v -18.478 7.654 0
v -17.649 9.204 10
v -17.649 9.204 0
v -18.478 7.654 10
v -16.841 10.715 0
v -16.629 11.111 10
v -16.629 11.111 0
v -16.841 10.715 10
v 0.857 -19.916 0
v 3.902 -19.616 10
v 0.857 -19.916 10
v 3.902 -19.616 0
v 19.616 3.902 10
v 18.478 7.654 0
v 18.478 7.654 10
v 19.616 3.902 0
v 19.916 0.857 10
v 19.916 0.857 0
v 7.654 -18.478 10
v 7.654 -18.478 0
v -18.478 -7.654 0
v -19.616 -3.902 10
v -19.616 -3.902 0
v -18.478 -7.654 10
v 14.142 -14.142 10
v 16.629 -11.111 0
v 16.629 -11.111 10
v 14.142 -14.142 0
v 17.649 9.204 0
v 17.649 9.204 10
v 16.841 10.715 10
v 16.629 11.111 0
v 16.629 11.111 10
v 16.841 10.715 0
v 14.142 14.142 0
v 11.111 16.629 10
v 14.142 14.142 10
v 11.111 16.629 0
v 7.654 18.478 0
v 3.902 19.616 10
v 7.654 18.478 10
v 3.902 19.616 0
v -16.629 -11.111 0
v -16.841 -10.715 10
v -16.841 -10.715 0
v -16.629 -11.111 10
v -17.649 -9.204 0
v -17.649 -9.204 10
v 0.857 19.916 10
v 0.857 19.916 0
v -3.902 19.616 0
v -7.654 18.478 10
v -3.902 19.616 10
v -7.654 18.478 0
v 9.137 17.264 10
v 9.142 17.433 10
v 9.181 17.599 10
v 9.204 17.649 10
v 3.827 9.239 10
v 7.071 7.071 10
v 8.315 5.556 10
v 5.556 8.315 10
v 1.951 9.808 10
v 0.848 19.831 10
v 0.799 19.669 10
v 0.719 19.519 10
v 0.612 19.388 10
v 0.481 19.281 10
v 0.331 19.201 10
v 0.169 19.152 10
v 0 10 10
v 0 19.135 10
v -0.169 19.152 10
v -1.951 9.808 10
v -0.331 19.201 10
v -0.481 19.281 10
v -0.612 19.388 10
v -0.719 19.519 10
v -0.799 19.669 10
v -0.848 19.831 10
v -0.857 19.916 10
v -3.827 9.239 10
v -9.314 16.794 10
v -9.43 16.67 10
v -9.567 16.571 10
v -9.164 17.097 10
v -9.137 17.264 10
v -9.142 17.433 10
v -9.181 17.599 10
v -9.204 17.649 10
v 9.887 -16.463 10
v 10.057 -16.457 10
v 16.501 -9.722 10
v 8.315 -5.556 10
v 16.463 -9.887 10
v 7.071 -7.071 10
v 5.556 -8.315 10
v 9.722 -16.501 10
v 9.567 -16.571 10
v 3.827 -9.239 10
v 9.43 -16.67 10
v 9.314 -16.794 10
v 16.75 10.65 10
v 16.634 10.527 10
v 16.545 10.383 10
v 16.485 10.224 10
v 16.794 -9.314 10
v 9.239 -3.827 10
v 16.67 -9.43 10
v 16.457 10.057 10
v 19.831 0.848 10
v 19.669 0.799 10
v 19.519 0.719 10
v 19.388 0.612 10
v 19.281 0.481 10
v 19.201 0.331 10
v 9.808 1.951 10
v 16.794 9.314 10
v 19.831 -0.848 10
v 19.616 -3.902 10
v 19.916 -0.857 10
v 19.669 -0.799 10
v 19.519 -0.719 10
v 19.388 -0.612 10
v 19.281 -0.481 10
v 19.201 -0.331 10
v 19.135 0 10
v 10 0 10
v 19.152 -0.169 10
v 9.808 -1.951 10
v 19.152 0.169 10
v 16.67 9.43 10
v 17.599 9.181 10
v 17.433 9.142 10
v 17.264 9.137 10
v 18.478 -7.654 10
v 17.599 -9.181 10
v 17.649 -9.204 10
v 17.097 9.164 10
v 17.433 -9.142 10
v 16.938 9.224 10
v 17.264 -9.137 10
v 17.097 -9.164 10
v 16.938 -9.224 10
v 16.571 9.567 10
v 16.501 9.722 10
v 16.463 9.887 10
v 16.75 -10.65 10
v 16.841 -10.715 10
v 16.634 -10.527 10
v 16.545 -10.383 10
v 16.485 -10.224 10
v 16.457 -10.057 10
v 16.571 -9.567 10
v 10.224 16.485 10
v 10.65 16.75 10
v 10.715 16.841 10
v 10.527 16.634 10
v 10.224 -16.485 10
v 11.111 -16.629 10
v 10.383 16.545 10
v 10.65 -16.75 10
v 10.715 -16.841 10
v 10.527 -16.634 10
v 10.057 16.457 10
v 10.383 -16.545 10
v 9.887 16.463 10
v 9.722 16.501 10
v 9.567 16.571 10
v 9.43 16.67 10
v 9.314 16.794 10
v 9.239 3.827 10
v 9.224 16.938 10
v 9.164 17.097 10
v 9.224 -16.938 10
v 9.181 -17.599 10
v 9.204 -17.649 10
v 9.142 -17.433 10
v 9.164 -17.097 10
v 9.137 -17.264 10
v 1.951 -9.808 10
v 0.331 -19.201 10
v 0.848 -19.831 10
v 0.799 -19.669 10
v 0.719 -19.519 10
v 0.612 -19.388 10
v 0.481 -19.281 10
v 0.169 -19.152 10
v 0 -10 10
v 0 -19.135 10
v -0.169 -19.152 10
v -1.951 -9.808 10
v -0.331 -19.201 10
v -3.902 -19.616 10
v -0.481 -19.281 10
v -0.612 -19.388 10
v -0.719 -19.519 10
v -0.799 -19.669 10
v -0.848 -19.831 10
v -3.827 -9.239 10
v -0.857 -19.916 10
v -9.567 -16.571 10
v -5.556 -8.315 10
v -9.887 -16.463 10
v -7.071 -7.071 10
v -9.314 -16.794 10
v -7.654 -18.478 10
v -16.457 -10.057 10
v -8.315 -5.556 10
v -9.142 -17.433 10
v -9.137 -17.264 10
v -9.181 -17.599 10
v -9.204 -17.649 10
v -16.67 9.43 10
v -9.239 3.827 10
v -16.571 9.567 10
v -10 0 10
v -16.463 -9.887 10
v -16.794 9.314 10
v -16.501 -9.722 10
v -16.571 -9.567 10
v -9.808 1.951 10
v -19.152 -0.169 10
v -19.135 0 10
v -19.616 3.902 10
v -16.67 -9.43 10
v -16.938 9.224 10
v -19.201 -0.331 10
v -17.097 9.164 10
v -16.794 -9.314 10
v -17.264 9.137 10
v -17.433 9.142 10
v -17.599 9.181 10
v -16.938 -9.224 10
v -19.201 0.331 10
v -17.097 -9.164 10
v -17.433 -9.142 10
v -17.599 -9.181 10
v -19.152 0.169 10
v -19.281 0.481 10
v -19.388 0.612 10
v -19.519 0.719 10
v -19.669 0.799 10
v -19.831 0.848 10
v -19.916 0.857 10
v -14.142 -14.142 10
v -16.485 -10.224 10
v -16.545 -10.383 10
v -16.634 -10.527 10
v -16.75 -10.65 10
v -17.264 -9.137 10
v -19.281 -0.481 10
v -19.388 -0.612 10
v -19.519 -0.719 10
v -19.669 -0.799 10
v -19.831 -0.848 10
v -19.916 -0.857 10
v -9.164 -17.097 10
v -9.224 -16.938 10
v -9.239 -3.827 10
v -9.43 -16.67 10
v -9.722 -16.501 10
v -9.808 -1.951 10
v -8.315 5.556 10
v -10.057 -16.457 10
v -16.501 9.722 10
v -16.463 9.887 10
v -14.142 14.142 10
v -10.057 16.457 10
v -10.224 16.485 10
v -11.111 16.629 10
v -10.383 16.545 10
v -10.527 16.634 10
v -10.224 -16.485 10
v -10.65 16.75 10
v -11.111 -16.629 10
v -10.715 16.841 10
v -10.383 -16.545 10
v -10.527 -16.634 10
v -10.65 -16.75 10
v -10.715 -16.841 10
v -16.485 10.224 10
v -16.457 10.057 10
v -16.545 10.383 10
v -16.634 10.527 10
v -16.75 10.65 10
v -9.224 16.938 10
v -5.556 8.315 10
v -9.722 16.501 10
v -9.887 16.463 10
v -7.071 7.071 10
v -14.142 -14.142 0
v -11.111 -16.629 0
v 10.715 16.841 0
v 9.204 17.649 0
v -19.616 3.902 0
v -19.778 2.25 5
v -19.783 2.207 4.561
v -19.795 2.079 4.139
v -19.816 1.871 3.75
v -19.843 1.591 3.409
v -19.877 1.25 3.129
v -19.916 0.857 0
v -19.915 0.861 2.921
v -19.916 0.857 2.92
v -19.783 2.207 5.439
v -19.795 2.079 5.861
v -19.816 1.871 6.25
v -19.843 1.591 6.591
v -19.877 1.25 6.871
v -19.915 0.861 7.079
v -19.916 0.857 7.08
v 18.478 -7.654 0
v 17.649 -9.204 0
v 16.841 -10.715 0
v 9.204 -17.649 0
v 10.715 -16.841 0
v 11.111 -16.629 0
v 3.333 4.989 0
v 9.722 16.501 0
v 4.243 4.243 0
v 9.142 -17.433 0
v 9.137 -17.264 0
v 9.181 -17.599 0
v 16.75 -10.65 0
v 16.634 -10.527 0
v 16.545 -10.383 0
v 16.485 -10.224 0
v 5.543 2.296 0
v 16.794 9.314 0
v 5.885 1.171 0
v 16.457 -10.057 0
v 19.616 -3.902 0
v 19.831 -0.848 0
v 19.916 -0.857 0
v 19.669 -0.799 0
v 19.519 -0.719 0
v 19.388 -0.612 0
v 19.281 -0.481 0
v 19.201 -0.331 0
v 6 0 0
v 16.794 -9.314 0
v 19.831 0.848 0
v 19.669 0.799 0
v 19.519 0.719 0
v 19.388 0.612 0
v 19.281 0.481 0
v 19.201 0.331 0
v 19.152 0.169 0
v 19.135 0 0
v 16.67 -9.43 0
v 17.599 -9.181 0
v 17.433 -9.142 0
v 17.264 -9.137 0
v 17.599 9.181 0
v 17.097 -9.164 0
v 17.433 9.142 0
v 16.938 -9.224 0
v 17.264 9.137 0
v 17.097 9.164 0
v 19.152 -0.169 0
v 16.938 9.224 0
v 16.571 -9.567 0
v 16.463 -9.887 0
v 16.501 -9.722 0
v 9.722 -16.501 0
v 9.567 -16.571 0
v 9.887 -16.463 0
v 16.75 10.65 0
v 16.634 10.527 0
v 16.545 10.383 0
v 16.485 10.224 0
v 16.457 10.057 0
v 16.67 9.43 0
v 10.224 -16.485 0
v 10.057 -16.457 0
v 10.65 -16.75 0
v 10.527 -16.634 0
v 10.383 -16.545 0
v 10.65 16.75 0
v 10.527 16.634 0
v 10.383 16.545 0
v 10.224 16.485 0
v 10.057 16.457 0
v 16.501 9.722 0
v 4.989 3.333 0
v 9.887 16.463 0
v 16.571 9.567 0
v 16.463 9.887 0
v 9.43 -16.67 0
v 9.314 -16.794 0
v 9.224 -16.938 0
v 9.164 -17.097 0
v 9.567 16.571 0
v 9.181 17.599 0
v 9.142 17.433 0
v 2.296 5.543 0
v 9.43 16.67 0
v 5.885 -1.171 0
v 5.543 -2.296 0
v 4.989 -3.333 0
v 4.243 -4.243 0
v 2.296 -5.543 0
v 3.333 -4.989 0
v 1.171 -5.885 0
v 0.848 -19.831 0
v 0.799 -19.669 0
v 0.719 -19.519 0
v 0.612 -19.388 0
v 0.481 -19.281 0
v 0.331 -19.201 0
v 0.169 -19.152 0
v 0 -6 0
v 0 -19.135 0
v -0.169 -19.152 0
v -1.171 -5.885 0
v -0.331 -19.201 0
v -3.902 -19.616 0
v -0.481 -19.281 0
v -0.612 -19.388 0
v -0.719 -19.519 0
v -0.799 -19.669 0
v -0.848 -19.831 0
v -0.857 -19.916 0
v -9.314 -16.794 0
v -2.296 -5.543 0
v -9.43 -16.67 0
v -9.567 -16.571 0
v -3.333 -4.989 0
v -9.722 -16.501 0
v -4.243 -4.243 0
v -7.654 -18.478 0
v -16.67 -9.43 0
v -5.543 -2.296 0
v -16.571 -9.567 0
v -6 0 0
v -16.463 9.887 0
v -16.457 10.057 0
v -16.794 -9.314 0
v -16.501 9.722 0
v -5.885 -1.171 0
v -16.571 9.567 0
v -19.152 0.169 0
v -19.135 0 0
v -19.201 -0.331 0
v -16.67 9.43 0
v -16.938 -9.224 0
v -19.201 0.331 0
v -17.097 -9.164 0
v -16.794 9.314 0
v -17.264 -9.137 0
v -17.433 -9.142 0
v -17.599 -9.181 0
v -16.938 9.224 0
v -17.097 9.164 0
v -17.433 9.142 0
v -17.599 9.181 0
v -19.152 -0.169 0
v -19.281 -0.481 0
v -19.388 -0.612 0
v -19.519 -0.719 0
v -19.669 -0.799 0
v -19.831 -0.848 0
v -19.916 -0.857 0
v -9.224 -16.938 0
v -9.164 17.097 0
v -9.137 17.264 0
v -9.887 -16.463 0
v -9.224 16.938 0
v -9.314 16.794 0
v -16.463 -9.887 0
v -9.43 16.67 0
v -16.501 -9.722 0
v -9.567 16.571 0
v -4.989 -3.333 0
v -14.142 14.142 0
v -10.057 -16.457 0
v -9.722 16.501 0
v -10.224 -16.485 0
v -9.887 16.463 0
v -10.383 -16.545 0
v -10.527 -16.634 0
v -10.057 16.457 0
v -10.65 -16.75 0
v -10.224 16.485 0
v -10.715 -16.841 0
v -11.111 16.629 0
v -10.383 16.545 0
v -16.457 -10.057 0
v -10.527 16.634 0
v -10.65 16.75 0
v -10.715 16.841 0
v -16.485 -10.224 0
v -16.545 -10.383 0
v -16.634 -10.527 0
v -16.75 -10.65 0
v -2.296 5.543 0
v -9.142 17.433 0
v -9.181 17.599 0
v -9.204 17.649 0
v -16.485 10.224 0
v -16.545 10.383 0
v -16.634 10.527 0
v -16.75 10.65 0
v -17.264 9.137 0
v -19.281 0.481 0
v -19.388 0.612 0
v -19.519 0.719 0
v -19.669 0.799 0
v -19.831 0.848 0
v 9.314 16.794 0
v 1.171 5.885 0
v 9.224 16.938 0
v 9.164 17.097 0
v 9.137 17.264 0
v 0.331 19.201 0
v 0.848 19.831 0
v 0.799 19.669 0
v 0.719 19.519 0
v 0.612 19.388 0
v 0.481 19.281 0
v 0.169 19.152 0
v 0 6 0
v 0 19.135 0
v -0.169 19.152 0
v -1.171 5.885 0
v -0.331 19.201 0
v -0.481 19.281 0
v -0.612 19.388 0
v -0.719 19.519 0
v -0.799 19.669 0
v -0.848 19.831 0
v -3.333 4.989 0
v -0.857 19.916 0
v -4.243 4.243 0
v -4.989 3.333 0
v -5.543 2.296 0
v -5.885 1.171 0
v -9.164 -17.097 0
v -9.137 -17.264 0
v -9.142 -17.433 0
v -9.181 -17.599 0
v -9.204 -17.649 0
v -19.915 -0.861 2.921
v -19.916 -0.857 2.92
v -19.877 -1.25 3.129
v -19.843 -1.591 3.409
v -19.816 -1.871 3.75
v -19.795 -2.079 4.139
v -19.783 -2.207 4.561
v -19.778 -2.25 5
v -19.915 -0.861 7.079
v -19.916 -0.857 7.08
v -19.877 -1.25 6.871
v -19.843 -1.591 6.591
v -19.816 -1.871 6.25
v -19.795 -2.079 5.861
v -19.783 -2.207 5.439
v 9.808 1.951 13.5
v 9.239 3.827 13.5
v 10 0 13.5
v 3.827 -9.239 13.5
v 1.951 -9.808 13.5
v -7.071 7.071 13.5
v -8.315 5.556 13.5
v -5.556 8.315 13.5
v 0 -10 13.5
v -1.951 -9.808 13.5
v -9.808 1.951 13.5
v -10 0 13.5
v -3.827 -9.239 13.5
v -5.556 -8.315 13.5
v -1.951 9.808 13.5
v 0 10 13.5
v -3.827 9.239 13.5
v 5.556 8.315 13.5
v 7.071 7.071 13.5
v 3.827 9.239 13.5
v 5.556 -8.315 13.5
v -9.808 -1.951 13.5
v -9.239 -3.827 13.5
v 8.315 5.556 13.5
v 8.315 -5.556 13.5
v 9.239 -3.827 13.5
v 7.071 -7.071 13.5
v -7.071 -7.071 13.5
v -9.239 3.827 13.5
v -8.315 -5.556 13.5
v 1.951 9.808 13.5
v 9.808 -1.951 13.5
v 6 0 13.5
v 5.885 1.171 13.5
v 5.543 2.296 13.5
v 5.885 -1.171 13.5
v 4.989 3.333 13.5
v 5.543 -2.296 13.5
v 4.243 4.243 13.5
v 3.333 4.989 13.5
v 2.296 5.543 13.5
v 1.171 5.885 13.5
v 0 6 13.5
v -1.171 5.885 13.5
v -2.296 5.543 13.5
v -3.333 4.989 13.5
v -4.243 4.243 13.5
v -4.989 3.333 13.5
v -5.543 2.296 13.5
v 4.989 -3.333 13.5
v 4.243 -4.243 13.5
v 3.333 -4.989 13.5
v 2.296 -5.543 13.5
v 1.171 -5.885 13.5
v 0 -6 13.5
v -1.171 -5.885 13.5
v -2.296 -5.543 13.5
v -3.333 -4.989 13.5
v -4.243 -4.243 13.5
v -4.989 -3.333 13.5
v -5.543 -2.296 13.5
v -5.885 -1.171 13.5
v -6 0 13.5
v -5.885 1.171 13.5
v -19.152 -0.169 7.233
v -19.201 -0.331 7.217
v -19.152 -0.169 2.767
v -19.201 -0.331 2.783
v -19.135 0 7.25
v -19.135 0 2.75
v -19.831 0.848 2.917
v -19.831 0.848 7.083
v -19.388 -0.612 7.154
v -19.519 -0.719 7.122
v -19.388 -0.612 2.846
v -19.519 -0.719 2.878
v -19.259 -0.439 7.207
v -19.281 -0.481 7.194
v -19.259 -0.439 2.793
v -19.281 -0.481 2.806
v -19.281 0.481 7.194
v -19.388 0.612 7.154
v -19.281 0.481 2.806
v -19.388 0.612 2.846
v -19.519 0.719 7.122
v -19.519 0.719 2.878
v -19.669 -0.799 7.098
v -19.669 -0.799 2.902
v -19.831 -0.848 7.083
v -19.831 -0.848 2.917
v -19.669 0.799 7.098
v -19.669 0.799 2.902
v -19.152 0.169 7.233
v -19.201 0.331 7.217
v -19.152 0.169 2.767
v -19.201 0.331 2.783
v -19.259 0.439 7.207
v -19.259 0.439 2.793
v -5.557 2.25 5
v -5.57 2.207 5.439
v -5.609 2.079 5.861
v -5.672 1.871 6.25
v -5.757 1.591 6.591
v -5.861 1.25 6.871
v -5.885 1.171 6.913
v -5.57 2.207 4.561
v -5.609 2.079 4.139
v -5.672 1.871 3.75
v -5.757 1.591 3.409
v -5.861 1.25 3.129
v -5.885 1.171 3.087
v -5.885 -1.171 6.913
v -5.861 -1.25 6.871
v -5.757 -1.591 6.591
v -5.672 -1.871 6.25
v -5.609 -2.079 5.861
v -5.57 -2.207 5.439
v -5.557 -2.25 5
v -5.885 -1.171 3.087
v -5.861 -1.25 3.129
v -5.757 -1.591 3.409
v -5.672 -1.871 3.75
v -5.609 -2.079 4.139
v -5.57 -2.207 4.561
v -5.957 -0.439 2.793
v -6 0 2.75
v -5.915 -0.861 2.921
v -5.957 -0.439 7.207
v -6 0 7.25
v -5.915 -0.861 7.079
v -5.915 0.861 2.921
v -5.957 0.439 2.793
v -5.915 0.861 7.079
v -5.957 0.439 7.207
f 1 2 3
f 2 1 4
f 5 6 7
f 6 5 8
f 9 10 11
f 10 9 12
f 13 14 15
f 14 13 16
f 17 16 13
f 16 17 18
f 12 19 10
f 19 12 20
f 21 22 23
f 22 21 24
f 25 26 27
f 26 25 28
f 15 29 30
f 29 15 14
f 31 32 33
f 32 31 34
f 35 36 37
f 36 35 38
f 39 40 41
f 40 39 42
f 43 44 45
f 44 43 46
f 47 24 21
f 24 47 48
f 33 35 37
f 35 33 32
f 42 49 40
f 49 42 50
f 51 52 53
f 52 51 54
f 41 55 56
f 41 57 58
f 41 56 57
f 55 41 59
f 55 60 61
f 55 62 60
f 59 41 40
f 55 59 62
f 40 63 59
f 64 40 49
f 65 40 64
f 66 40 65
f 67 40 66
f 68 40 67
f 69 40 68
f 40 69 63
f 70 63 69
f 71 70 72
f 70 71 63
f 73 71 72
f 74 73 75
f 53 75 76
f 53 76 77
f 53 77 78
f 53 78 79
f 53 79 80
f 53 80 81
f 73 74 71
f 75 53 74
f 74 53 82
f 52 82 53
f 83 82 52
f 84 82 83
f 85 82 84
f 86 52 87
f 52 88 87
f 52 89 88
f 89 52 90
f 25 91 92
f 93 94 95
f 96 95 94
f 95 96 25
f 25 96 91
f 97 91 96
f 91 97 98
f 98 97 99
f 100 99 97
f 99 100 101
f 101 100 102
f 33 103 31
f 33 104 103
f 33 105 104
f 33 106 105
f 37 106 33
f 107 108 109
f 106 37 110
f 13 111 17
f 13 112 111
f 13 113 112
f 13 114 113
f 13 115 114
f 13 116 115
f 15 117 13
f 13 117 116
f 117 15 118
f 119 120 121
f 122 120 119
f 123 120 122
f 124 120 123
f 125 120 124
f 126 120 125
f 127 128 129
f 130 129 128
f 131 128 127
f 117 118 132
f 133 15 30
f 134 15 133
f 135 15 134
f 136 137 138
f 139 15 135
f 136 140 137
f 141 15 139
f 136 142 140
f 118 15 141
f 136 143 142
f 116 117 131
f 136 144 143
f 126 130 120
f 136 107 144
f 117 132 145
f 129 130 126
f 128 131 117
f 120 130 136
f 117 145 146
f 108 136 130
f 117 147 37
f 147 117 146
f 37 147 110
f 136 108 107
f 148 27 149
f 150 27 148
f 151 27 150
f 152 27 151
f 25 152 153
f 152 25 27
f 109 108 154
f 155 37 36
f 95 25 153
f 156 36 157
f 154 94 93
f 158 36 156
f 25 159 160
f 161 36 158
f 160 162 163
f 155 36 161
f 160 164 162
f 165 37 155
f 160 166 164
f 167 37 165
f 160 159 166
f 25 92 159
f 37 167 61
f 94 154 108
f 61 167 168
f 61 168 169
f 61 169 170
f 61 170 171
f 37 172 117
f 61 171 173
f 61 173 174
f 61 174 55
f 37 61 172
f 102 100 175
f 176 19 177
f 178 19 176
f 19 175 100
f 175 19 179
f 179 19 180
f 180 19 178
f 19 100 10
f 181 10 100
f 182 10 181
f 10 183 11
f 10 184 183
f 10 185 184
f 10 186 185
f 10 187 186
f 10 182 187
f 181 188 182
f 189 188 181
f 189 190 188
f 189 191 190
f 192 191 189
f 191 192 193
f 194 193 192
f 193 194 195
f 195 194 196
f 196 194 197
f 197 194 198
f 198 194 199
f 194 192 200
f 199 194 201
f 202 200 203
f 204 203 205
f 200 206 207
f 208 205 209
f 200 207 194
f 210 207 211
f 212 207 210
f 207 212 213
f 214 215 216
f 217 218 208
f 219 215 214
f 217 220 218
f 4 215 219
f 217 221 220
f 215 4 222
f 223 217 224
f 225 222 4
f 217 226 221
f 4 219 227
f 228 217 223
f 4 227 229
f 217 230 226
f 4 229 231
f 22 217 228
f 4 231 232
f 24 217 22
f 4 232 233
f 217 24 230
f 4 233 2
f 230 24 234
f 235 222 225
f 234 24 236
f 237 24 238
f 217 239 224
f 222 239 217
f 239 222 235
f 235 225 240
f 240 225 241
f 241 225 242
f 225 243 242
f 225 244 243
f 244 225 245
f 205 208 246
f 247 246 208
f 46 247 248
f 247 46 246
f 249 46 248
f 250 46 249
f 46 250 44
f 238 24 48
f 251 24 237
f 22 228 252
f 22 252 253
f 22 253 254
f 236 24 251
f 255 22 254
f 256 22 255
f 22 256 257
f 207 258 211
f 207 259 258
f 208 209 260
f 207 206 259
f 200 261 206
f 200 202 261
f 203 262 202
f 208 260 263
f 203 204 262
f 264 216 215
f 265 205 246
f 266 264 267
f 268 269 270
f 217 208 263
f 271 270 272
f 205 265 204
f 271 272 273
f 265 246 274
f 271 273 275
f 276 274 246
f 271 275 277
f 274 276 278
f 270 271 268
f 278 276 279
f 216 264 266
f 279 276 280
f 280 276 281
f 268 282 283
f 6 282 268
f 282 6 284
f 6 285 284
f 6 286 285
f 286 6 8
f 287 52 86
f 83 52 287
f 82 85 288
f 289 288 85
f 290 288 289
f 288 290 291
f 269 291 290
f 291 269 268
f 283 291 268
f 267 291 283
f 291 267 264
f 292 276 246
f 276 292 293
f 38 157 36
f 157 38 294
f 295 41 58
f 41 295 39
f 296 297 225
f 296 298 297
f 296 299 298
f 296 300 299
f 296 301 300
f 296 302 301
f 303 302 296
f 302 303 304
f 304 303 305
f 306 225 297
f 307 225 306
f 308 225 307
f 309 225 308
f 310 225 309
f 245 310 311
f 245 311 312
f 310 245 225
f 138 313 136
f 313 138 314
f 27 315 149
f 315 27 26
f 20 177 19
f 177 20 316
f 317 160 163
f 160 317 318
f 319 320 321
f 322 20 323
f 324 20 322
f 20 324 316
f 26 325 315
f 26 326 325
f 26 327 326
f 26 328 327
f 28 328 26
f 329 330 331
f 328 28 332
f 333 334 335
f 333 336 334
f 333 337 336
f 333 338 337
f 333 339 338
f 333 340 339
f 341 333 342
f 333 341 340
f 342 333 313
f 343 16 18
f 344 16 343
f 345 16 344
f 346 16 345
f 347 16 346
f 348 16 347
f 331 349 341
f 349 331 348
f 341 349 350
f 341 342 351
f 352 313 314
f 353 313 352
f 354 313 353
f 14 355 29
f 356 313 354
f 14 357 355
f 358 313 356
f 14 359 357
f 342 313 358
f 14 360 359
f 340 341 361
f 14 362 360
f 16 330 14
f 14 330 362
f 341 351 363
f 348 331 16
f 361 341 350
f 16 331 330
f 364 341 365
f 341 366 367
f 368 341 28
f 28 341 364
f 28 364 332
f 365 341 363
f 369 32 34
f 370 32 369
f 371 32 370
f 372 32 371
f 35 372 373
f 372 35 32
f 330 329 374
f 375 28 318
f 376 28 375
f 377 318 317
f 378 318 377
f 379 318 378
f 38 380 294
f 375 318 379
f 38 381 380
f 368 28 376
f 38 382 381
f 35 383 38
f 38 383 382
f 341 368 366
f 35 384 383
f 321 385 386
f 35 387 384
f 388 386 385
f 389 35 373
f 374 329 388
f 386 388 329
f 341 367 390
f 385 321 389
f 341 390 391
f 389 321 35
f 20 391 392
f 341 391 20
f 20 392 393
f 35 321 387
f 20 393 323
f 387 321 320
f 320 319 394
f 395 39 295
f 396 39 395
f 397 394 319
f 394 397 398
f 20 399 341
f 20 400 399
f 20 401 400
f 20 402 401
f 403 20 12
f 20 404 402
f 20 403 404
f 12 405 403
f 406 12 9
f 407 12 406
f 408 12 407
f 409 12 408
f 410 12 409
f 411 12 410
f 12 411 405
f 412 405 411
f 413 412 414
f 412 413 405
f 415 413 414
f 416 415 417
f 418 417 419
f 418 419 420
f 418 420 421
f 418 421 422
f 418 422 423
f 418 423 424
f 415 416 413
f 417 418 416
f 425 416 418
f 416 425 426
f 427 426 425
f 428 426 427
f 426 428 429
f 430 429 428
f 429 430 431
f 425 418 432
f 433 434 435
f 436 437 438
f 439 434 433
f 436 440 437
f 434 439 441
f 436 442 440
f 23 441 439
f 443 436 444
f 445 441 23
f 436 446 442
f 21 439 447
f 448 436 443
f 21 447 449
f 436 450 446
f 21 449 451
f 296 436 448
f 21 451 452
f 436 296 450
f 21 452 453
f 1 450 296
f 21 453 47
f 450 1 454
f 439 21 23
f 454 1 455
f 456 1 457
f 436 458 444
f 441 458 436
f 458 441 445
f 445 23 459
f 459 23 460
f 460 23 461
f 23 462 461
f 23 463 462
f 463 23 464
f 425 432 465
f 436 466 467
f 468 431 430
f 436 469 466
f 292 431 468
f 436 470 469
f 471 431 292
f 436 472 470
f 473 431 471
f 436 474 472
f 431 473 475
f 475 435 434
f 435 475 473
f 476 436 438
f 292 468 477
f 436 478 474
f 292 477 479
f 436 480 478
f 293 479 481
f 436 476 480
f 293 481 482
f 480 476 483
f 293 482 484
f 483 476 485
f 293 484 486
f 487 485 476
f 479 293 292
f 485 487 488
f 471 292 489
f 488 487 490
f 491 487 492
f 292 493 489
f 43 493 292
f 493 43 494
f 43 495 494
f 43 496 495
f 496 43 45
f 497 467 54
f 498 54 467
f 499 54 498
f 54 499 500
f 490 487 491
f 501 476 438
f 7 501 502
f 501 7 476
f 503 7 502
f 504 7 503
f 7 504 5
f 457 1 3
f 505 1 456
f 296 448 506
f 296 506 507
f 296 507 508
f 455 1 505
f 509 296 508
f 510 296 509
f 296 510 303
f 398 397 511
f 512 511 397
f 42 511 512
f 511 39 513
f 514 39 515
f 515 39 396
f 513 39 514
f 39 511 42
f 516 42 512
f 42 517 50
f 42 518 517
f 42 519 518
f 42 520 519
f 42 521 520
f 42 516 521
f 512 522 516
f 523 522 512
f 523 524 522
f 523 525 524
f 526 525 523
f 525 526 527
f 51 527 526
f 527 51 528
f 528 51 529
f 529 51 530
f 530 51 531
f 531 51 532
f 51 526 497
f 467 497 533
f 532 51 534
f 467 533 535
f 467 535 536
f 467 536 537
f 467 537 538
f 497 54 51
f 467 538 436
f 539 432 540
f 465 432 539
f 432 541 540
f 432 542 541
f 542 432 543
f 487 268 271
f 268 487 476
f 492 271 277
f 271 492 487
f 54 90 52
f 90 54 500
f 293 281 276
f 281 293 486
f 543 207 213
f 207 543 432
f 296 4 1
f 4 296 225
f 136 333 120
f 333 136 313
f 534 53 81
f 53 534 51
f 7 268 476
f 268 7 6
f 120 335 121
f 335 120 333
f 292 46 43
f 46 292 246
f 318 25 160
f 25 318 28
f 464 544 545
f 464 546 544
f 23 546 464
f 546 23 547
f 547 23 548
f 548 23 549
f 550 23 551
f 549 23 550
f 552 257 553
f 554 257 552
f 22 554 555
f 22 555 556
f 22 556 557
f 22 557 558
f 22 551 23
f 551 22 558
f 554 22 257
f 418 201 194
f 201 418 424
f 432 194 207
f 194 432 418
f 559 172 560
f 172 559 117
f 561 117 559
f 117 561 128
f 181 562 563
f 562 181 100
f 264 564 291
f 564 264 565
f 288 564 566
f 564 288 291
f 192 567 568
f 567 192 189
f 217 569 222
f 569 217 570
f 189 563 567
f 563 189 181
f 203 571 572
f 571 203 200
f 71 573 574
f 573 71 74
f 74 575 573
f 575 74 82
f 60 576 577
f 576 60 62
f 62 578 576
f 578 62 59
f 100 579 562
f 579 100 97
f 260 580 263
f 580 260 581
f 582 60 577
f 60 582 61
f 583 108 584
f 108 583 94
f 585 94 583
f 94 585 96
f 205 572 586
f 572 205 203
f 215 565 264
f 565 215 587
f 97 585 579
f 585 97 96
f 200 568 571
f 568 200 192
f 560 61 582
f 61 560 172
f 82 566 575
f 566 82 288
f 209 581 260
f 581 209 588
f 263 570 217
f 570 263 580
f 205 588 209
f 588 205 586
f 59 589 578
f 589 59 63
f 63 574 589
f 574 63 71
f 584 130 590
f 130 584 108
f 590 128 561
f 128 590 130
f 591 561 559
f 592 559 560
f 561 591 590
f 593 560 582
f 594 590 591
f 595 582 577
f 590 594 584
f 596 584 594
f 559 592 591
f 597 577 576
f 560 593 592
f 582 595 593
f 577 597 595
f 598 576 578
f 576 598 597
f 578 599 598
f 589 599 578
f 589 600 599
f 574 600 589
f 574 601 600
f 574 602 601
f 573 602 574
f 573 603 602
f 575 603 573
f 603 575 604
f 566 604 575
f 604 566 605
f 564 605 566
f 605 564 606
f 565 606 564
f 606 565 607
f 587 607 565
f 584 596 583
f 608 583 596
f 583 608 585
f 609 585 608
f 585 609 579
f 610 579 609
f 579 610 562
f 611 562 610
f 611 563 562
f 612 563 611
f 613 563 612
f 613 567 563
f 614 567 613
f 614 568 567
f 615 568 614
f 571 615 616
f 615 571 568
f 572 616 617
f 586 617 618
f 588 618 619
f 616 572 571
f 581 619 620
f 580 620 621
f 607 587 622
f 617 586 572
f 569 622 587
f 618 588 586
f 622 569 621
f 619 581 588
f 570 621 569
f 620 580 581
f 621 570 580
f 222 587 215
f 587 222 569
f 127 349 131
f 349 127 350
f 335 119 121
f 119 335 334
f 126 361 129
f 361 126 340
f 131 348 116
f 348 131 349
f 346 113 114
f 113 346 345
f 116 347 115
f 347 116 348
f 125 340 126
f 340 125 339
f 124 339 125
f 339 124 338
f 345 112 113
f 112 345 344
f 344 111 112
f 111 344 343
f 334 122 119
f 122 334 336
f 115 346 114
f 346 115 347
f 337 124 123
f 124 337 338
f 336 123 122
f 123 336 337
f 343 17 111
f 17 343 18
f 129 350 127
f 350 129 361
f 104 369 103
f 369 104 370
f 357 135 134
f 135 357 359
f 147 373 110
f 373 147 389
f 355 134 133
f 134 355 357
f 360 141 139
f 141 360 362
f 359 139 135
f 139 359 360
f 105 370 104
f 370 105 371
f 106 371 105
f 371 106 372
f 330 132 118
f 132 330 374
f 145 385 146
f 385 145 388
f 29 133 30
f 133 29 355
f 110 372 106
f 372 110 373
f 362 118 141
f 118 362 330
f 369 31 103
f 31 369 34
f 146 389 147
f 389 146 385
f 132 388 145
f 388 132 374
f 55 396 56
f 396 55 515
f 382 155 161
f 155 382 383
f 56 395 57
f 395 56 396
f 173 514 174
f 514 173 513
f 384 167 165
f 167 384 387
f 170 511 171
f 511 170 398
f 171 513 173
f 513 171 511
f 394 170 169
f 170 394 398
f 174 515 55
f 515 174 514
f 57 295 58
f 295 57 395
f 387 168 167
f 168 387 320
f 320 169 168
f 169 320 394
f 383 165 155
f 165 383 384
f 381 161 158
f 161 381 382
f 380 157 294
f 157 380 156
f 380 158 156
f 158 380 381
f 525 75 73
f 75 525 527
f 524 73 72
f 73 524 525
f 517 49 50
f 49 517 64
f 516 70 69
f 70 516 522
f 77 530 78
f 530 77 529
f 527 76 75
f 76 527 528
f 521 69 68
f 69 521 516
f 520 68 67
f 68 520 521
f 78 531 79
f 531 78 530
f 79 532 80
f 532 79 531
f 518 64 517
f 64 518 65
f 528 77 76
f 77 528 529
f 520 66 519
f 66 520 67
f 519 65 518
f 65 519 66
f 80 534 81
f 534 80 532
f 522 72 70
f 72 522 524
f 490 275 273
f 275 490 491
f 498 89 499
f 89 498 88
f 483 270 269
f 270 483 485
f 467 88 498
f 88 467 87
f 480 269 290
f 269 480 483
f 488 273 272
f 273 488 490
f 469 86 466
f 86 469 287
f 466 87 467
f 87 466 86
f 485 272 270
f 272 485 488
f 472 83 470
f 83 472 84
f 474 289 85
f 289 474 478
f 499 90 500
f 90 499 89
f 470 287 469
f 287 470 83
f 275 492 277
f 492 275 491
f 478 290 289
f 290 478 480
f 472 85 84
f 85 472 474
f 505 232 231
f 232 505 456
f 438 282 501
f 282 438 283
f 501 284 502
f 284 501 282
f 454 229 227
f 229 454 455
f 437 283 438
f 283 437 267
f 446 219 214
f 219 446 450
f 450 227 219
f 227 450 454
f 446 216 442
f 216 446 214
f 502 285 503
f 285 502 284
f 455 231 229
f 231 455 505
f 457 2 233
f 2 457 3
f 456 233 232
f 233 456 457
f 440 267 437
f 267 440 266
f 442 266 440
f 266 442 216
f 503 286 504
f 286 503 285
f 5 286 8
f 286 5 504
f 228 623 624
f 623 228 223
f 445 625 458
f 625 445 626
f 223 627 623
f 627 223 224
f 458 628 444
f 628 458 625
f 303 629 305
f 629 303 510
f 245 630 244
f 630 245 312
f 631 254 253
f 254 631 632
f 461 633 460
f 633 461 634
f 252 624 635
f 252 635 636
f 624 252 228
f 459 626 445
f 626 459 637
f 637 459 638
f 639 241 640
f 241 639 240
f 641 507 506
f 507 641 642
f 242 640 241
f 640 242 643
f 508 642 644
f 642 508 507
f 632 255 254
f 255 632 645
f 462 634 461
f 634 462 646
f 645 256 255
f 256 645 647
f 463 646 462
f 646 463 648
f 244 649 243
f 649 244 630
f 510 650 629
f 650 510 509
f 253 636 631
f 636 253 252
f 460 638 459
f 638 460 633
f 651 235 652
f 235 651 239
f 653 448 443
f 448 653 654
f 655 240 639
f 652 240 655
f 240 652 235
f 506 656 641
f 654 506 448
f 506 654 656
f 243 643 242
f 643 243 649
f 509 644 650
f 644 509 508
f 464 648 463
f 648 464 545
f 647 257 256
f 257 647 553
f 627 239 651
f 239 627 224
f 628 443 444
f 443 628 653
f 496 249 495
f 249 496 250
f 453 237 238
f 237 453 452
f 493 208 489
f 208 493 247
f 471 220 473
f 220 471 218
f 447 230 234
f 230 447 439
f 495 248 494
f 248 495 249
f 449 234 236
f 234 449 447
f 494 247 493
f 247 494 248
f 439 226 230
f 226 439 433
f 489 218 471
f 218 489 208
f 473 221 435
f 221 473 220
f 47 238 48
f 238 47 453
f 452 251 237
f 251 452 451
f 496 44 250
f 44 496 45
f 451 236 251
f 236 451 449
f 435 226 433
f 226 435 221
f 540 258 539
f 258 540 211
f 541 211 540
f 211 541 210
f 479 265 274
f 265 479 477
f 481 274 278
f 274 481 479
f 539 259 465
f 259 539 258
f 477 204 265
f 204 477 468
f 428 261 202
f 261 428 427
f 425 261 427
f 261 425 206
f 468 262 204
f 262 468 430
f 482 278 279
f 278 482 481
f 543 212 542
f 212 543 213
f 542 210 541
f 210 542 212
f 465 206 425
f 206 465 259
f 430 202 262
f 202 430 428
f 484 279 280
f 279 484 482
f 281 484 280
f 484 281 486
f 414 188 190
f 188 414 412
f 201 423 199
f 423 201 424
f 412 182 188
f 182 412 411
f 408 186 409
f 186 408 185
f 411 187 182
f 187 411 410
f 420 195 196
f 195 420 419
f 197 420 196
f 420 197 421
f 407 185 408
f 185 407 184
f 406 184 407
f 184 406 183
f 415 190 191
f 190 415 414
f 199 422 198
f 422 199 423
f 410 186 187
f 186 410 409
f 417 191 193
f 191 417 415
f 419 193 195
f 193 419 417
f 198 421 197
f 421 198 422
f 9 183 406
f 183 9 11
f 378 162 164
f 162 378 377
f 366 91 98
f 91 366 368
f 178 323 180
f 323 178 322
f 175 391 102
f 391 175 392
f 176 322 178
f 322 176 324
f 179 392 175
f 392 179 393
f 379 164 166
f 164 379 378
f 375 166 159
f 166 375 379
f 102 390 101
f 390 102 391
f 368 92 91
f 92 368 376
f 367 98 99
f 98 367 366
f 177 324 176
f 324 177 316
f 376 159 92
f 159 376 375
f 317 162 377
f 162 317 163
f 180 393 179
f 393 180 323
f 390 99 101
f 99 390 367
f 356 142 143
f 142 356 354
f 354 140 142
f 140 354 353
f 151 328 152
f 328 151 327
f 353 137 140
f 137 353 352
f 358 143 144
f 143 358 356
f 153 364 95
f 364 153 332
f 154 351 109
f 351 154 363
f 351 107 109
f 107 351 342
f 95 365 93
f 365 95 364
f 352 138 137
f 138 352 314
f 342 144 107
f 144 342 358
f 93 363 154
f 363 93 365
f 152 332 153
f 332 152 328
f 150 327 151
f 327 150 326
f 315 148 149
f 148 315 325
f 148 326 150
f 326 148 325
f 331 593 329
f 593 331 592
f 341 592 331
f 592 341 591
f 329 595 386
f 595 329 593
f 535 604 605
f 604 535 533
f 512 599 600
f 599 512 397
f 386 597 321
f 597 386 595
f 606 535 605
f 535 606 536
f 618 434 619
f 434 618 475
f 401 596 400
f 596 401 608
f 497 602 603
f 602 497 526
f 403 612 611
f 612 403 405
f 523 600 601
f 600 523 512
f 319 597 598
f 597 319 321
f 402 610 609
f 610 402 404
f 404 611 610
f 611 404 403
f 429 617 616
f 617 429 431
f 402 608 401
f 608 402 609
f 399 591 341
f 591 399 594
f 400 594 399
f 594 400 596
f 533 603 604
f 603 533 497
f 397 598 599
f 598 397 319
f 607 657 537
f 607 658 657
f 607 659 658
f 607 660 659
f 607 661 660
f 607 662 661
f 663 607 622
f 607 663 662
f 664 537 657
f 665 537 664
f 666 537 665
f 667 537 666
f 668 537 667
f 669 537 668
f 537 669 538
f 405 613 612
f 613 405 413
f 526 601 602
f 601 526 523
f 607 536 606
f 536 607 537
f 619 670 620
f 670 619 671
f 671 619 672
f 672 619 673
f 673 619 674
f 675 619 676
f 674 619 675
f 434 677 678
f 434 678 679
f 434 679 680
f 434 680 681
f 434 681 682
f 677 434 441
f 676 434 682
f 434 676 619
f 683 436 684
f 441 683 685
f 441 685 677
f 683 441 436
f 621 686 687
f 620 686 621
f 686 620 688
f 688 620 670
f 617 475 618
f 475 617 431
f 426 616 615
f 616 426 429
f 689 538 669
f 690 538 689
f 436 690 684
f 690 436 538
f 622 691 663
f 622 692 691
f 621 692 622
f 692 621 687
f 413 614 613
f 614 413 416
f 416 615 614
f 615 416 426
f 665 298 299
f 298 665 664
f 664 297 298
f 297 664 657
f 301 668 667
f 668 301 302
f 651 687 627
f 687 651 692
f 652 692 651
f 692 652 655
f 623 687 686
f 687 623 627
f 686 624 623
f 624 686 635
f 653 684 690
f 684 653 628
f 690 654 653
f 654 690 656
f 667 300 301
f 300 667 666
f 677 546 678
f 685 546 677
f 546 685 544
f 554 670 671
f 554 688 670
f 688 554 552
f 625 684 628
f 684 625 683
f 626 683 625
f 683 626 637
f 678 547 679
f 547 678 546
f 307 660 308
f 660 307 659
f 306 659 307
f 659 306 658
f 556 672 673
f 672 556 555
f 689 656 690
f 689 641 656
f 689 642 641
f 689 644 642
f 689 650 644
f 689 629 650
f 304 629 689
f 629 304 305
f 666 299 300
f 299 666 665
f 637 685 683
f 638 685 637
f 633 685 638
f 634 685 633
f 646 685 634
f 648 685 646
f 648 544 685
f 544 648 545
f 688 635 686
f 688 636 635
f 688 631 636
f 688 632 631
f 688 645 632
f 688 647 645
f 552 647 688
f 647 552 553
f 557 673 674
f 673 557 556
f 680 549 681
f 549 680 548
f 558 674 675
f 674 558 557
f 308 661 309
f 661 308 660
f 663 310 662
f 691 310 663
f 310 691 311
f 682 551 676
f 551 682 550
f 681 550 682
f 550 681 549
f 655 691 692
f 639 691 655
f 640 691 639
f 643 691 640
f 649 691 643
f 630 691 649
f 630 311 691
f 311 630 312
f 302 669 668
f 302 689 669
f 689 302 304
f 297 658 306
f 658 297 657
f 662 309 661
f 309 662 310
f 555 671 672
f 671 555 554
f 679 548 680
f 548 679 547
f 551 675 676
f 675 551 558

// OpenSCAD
$fn = 32;

// ----------------------------------------------------------------------
// Hand knob: 40 x 40 x 13.5 mm
// ----------------------------------------------------------------------

// --- parameters (mm) ---
head_d = 40;              // knob diameter
head_h = 10;              // knob height
hole_d = 12;              // shaft bore
set_d = 4.5;              // set screw tap hole
notch_d = 1.73;           // knurl groove diameter
knurl_n = 12;             // number of knurl grooves
cap_h = 3.5;              // raised centre cap
cap_d = 20;               // centre cap diameter

module body() {
  cylinder(h = head_h, d = head_d);
}

module cap() {
  translate([0, 0, head_h - 1]) cylinder(h = cap_h + 1, d = cap_d);
}

difference() {
  union() {
    body();
    cap();
  }
  translate([0, 0, -1]) cylinder(h = head_h + cap_h + 2, d = hole_d);
  /* knurl grooves */
  for (i = [0 : knurl_n - 1])
    rotate([0, 0, i * 360 / knurl_n])
      translate([head_d / 2, 0, -0.5])
        cylinder(h = head_h + 1, d = notch_d);
  translate([-head_d / 2 - 1, 0, head_h * 0.5]) rotate([0, 90, 0]) cylinder(h = head_d / 2 + 2, d = set_d);
}
